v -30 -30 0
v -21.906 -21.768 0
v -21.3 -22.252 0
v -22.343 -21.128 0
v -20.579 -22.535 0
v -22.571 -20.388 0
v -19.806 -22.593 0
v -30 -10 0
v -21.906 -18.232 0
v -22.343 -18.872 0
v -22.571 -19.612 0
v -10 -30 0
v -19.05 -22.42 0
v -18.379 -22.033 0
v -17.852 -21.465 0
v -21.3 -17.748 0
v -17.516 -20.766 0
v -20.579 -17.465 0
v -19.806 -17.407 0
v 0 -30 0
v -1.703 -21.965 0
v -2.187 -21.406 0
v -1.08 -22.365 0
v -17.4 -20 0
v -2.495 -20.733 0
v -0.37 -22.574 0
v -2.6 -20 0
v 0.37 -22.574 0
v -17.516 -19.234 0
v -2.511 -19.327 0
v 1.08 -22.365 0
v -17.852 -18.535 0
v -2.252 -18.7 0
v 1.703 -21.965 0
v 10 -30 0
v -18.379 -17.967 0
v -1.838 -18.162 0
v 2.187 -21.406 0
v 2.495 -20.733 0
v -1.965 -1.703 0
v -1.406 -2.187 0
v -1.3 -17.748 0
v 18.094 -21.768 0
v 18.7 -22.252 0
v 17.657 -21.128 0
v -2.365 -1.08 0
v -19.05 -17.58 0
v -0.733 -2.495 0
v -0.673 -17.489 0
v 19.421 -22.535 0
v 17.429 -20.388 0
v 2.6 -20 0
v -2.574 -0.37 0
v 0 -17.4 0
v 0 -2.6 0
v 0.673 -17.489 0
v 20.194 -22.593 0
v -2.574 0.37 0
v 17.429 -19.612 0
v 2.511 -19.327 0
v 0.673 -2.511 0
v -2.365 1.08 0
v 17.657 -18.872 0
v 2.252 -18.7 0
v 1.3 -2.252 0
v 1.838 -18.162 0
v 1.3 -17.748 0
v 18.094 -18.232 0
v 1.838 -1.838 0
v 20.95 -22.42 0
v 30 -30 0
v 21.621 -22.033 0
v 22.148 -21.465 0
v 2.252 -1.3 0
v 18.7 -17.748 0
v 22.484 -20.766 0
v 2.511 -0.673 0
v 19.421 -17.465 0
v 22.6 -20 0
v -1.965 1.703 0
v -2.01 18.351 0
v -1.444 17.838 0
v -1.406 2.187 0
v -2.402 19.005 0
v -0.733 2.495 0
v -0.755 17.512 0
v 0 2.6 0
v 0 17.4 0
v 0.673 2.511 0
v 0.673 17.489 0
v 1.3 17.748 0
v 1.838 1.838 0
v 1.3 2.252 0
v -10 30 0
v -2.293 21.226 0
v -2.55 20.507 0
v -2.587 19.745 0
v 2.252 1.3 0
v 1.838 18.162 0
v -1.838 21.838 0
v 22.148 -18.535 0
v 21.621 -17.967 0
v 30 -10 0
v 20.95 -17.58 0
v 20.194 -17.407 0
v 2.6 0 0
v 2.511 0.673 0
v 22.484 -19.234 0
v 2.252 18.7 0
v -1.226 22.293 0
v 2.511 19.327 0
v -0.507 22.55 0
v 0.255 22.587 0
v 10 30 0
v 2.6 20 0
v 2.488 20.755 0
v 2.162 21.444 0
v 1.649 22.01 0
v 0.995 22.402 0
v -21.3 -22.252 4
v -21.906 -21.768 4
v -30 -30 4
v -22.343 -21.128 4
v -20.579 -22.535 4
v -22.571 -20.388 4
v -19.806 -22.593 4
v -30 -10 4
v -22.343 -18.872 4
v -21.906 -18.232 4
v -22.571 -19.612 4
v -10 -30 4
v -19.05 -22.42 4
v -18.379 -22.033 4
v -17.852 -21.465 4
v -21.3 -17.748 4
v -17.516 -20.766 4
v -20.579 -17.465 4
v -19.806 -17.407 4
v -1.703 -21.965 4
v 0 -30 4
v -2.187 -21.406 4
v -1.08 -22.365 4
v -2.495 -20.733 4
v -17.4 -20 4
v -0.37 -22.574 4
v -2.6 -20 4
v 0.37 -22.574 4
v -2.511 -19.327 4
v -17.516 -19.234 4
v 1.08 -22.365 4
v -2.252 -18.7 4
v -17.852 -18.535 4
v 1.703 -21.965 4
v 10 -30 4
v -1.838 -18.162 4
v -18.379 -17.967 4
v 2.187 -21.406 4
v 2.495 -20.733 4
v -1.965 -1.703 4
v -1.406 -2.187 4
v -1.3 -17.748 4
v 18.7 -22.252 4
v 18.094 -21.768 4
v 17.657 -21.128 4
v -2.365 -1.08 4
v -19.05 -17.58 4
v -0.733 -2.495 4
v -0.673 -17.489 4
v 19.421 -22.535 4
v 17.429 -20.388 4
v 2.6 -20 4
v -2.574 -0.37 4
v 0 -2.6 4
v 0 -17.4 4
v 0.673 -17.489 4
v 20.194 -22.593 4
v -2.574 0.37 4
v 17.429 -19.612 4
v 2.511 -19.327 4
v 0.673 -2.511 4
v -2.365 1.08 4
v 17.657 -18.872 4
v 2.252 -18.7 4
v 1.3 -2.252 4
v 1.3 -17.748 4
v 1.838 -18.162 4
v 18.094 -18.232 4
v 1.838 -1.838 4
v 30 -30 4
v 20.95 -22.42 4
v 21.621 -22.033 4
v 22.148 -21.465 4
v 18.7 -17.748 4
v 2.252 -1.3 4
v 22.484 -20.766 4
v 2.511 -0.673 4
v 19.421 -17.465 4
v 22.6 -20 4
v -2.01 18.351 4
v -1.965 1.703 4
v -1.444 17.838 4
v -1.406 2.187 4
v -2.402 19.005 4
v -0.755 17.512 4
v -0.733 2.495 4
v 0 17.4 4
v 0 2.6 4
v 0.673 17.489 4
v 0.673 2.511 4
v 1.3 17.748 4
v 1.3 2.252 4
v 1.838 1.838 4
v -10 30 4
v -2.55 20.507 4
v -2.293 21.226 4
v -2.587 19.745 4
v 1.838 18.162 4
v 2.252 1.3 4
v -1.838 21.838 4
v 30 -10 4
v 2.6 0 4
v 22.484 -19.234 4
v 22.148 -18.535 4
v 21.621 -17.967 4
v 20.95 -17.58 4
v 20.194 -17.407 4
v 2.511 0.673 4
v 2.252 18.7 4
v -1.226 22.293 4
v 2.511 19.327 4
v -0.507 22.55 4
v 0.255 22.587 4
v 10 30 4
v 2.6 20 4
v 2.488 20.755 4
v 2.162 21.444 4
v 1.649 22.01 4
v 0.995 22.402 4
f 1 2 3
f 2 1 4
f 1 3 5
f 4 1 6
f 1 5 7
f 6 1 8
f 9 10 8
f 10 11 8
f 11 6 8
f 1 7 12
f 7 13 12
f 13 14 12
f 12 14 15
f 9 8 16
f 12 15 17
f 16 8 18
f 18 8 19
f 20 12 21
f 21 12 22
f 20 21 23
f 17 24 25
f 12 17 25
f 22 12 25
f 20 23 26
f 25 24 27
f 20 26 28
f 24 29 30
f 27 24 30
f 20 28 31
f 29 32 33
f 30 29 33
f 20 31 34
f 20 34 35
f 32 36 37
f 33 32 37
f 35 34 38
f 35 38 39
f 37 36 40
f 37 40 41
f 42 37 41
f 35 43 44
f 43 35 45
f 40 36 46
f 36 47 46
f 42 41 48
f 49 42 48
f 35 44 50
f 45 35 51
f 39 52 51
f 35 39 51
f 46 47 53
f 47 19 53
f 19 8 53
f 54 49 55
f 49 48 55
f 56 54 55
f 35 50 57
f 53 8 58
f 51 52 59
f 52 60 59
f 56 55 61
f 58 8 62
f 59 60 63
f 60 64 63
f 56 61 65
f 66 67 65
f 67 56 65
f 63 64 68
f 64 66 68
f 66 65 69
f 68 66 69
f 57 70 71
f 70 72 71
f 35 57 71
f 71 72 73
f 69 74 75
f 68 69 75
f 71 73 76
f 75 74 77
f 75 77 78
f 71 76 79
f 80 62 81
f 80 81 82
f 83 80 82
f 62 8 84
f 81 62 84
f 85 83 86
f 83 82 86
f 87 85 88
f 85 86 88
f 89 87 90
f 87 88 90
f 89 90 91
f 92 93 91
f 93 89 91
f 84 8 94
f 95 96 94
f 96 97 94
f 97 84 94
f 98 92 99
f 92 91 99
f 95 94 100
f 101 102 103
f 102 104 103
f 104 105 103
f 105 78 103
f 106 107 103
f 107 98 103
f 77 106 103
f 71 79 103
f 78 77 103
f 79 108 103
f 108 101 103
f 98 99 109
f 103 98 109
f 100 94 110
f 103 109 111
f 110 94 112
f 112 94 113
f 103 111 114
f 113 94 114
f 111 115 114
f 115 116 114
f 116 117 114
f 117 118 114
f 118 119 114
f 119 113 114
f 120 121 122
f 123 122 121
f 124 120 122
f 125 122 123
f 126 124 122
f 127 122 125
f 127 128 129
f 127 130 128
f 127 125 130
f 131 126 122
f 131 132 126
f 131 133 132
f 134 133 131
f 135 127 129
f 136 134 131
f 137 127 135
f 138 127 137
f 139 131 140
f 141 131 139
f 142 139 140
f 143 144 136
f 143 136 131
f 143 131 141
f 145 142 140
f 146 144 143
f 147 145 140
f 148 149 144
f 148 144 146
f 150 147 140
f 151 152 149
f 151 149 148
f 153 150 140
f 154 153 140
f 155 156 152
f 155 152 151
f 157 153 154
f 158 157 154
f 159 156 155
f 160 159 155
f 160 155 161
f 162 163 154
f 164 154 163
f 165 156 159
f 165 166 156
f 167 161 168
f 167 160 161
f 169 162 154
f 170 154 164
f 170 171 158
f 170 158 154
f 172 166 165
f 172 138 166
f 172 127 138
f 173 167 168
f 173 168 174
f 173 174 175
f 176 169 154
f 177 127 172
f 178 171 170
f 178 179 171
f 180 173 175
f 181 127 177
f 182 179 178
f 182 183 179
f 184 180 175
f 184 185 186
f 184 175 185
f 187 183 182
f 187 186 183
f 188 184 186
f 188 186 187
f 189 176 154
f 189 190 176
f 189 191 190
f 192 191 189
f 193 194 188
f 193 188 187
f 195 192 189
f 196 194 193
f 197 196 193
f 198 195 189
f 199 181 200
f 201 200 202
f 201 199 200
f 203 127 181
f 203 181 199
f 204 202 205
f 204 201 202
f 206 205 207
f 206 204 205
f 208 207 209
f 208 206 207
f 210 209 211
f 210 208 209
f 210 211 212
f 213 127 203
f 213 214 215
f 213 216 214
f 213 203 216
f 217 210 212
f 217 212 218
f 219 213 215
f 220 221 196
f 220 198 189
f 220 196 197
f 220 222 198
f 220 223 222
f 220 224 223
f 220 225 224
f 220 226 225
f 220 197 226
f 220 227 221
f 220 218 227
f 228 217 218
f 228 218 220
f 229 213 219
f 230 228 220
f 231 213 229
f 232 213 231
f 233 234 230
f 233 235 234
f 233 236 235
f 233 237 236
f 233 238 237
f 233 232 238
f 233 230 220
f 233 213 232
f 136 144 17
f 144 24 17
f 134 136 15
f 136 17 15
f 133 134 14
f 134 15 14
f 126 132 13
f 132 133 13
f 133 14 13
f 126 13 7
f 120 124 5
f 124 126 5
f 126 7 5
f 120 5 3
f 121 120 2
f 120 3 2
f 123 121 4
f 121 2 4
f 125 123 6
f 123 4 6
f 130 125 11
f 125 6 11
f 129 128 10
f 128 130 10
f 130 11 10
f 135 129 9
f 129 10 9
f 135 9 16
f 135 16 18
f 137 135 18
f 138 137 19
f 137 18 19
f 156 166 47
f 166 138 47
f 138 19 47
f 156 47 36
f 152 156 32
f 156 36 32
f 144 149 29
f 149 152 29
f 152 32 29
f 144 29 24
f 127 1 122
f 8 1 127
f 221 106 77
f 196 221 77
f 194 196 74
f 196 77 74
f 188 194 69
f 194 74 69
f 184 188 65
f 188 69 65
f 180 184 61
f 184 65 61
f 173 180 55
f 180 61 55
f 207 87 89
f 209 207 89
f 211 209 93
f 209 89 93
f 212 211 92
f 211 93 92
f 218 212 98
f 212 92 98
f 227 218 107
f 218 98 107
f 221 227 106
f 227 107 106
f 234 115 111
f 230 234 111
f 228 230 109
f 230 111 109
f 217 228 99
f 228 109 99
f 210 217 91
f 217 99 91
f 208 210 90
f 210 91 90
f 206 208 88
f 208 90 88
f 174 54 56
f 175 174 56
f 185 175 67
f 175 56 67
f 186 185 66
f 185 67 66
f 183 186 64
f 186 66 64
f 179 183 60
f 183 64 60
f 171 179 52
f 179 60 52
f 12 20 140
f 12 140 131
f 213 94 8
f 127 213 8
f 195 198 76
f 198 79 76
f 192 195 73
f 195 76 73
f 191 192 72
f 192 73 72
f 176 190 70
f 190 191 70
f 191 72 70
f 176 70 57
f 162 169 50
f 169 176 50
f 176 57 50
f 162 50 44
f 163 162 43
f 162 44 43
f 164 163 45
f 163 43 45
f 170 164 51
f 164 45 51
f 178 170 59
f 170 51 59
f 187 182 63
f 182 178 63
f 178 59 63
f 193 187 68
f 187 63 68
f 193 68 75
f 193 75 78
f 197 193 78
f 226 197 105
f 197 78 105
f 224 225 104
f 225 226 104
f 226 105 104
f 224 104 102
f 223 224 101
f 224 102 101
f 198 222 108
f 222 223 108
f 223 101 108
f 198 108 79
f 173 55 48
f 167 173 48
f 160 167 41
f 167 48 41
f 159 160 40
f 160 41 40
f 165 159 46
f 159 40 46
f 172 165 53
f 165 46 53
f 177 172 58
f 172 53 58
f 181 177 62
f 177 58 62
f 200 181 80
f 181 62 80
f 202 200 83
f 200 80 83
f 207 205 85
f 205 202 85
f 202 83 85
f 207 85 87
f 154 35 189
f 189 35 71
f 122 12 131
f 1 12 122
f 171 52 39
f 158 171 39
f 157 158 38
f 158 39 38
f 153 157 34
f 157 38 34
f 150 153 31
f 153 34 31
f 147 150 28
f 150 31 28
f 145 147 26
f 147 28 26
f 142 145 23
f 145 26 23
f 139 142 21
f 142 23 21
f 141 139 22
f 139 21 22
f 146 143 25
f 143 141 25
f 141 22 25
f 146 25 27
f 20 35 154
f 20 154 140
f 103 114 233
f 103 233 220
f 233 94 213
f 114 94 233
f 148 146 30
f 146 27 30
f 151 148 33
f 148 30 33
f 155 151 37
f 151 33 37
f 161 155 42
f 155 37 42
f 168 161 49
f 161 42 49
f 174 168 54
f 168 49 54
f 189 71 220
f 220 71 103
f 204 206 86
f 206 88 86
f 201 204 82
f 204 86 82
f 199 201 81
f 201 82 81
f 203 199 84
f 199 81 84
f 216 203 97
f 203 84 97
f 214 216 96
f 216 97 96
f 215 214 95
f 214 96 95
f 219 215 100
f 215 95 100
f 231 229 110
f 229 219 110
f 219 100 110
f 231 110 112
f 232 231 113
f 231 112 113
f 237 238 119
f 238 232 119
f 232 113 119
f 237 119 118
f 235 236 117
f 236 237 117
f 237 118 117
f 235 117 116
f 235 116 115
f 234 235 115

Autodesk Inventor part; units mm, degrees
ref_plane "YZ Plane" through (0, 0, 0) normal (1, 0, 0) x (0, 1, 0)
ref_plane "XZ Plane" through (0, 0, 0) normal (0, 1, 0) x (-1, 0, 0)
ref_plane "XY Plane" through (0, 0, 0) normal (0, 0, 1) x (1, 0, 0)
sketch "Sketch1" plane through (0, 0, 0) normal (0, 0, 1) x (1, 0, 0)
  line L0 (10, -30) -> (-10, -30)
  line L1 (-10, 30) -> (10, 30)
  line L2 (0, -30) -> (-30, -30)
  line L3 (0, -30) -> (30, -30)
  line L4 (30, -30) -> (30, -10)
  line L5 (-30, -30) -> (-30, -10)
  line L6 (-10, 30) -> (-30, -10)
  line L7 (10, 30) -> (30, -10)
  circle A0 centre (0, 0) radius 2.6
  line L8 (0, 0) -> (0, 20)
  line L9 (0, 0) -> (20, 0) construction
  circle A1 centre (0, 20) radius 2.6
  line L10 (0, 0) -> (0, -20)
  circle A2 centre (0, -20) radius 2.6
  line L11 (0, -20) -> (-20, -20)
  line L12 (0, -20) -> (20, -20) construction
  circle A3 centre (-20, -20) radius 2.6
  circle A4 centre (20, -20) radius 2.6
  dimension "d7" = 60
  dimension "d8" = 5.2
  dimension "d9" = 20
  dimension "d10" = 90
  dimension "d11" = 5.2
  dimension "d12" = 20
  dimension "d13" = 5.2
  dimension "d14" = 20
  dimension "d15" = 180
  dimension "d16" = 5.2
  dimension "d17" = 5.2
extrude "Extrusion1" add sketch "Sketch1" along normal blind 4
properties part number "2020 T Plate Bracket Connectors"
